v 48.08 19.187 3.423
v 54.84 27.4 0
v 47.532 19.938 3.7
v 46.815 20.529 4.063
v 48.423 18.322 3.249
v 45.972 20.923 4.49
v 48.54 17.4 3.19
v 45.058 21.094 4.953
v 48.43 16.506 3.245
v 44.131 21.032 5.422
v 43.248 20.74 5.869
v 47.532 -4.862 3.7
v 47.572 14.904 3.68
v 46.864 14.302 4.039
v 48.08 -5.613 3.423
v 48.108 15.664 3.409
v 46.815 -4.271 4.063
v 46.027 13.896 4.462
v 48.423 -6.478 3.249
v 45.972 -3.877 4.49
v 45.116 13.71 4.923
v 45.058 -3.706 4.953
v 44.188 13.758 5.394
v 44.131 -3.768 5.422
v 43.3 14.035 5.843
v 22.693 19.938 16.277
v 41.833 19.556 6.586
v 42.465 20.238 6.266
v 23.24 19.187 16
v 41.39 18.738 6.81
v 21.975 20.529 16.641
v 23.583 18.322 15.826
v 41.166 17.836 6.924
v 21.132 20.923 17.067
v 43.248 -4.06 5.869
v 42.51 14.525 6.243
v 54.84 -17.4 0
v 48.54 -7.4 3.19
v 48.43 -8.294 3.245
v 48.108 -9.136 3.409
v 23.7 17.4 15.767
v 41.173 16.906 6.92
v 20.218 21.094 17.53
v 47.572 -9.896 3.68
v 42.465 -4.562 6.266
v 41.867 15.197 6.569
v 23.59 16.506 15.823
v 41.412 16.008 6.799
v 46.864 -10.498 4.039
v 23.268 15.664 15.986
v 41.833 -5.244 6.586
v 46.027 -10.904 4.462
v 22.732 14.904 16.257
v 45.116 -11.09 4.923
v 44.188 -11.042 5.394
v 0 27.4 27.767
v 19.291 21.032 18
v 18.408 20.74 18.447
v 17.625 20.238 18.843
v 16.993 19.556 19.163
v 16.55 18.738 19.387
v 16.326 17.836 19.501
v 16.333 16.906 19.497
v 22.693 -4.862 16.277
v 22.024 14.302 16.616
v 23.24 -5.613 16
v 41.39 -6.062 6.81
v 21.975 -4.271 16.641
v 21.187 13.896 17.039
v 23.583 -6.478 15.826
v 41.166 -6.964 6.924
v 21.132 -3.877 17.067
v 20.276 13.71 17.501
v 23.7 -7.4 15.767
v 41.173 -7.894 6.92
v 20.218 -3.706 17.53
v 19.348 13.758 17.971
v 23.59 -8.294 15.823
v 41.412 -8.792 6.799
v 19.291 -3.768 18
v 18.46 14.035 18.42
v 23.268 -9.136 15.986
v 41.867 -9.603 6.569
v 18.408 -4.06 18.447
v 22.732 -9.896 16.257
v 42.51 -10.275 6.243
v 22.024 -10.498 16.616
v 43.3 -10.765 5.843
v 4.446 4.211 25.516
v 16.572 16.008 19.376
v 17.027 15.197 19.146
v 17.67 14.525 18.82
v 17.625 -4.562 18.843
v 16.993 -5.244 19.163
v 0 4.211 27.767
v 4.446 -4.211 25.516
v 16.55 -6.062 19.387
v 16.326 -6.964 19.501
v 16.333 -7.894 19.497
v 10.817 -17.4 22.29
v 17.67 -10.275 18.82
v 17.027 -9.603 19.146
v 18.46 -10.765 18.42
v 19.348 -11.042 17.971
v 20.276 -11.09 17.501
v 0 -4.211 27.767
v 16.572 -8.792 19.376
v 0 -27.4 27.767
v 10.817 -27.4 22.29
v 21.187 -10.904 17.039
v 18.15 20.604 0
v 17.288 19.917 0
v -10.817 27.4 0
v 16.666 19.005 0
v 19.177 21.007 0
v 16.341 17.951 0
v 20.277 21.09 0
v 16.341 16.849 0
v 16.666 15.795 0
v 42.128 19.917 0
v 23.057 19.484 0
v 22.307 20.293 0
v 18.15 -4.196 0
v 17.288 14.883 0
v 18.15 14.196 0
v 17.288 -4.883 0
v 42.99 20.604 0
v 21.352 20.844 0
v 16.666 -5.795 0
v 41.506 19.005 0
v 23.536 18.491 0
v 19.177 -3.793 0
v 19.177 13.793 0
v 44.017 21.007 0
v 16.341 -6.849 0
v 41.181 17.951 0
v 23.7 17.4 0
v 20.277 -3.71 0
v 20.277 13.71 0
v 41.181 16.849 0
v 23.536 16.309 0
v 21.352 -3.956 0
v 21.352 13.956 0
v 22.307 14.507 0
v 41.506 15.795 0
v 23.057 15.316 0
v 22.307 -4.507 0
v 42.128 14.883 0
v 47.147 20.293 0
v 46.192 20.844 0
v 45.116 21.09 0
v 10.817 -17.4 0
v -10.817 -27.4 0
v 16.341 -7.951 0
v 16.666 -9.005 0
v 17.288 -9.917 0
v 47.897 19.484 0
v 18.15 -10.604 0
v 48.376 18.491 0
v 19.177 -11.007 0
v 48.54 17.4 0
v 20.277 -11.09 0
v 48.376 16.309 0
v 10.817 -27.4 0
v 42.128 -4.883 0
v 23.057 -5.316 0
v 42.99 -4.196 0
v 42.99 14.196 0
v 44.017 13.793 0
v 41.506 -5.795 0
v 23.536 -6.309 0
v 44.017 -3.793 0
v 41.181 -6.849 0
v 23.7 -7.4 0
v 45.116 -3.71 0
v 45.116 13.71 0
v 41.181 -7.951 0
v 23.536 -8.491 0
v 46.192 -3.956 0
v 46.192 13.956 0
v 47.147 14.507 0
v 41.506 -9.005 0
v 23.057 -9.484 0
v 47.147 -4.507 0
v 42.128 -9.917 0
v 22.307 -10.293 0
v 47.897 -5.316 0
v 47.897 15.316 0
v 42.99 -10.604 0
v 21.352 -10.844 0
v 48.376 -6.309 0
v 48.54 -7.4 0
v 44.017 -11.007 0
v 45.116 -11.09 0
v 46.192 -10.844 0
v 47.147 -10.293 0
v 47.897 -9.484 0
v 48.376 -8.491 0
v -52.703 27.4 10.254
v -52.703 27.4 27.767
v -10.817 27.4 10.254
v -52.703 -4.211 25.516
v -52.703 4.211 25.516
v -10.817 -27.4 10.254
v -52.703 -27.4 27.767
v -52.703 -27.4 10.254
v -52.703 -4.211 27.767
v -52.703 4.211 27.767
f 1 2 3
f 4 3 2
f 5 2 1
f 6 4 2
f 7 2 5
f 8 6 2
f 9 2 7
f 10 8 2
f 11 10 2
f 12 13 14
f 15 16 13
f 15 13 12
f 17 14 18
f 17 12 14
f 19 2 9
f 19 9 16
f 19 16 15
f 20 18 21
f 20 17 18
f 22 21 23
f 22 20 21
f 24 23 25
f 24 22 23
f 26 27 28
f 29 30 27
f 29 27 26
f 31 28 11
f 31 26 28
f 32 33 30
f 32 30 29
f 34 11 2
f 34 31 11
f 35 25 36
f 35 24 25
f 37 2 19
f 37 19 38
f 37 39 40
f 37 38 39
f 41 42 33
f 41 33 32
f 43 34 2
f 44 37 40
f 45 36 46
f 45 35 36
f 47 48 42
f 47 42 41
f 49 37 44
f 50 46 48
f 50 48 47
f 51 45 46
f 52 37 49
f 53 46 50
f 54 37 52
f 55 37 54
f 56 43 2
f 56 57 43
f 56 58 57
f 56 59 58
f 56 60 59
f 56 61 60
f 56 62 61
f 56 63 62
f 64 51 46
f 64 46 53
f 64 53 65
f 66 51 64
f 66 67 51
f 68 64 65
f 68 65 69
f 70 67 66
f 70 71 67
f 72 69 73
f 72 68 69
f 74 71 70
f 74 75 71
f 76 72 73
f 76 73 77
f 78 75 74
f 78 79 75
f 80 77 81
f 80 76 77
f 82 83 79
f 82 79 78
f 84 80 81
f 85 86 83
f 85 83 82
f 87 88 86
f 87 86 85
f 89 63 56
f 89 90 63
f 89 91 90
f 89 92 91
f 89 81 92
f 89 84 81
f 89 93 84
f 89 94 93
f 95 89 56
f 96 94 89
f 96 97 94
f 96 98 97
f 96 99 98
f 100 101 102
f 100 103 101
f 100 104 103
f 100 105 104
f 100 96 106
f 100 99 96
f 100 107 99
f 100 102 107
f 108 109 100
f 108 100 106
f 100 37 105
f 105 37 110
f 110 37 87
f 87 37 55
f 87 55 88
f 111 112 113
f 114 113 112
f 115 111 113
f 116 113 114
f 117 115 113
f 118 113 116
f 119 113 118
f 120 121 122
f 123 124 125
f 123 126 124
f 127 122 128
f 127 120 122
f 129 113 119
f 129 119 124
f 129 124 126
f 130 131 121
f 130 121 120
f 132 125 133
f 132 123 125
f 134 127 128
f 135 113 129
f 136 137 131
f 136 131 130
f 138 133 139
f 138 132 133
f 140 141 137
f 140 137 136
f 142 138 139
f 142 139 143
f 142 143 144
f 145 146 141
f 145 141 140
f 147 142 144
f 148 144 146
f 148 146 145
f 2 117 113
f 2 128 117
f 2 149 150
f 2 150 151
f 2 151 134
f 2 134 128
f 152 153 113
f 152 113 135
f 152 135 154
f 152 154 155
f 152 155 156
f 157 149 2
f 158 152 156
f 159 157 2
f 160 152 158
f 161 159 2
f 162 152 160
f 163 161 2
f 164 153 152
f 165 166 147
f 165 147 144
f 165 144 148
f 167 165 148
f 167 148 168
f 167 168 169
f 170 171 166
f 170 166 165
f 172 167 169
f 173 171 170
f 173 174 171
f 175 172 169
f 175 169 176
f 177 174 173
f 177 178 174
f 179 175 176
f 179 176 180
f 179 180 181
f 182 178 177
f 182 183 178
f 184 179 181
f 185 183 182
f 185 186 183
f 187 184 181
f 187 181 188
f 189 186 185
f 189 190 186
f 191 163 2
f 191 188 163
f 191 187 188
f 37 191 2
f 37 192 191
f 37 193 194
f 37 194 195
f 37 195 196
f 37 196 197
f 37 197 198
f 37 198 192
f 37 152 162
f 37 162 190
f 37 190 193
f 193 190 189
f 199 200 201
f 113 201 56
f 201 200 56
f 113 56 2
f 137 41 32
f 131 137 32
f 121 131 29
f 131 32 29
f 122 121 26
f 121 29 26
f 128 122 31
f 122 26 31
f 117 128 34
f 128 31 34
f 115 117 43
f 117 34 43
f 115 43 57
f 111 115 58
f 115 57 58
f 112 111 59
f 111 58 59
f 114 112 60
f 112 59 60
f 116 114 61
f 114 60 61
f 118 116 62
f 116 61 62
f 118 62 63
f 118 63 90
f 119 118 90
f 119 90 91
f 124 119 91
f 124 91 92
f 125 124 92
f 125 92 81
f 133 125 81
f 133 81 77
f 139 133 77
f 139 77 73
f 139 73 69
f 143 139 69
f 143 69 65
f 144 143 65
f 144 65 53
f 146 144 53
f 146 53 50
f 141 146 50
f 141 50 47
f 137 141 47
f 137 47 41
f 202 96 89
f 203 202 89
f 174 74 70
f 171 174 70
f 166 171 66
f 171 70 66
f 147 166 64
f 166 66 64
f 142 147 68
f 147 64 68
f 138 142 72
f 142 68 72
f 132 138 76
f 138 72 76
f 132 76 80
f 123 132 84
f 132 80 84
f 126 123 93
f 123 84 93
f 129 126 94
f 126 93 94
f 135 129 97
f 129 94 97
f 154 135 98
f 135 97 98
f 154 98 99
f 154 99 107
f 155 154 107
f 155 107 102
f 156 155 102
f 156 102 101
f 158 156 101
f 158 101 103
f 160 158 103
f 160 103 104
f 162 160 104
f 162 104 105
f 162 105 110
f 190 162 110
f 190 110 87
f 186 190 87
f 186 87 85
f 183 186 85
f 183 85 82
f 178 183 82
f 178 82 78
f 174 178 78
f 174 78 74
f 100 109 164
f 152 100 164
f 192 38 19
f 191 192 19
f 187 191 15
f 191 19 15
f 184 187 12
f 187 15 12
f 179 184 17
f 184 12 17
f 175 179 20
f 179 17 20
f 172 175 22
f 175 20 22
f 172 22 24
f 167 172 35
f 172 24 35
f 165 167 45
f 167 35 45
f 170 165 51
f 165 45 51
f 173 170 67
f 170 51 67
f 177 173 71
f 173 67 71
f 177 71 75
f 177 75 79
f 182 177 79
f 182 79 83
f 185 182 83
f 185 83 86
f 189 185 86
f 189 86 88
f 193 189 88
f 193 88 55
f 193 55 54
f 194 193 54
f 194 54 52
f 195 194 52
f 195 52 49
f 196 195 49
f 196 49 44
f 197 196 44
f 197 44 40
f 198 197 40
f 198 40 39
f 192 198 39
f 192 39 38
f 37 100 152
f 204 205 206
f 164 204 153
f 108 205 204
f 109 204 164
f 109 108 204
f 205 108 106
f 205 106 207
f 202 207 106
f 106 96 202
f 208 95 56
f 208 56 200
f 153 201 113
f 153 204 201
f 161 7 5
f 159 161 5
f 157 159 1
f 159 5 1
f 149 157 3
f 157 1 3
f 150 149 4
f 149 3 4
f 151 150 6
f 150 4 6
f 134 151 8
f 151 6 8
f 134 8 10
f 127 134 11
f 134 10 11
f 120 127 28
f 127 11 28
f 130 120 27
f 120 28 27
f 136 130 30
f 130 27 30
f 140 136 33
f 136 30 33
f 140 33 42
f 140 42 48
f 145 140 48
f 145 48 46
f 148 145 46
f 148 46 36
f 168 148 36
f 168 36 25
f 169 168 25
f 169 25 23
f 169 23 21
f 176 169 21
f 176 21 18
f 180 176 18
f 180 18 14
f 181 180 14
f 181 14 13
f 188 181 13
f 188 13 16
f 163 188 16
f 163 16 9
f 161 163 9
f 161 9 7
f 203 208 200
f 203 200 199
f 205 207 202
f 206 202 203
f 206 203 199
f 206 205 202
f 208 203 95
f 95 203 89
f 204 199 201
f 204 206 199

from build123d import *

# Parameters (mm, degrees)
F1_DEPTH = 27.4
F3_DEPTH = 10
F5_DEPTH = 88.2
F6_R     = 3.700156
F7_DEPTH = 27.768068


with BuildPart() as f1:
    # F0 (on Front) → F1 (new body, symmetric)
    with BuildSketch(Plane.XZ):
        Polygon((-10.816675, 0), (0, 0), (0, 27.767068), (-52.702516, 27.767068), (-52.702516, 10.254359), (-10.816675, 10.254359), align=None)
        Polygon((0, 27.767068), (0, 0), (10.816675, 0), (54.839961, 0), align=None)
    extrude(amount=F1_DEPTH, both=True)

    # F2 (on face) → F3 (cut)
    with BuildSketch(Plane.XZ.offset(27.4)):
        Polygon((10.816675, 22.290271), (10.816675, 0), (54.839961, 0), align=None)
    extrude(amount=-F3_DEPTH, mode=Mode.SUBTRACT)

    # F4 (on Right) → F5 (cut, symmetric)
    with BuildSketch(Plane.YZ):
        Polygon((-4.211452, 25.516083), (0, 25.516083), (4.211452, 25.516083), (4.211452, 28.770475), (-4.211452, 28.770475), align=None)
    extrude(amount=F5_DEPTH, both=True, mode=Mode.SUBTRACT)

    # F6 (on face) → F7 (cut, through all)
    with BuildSketch(Plane.XY.offset(27.767068)):
        with Locations((20, 17.4)):
            Circle(F6_R)
        with Locations((44.839961, 17.4)):
            Circle(F6_R)
        with Locations((44.839961, -7.4)):
            Circle(F6_R)
        with Locations((20, -7.4)):
            Circle(F6_R)
    extrude(amount=-F7_DEPTH, mode=Mode.SUBTRACT)


solid = f1.part
